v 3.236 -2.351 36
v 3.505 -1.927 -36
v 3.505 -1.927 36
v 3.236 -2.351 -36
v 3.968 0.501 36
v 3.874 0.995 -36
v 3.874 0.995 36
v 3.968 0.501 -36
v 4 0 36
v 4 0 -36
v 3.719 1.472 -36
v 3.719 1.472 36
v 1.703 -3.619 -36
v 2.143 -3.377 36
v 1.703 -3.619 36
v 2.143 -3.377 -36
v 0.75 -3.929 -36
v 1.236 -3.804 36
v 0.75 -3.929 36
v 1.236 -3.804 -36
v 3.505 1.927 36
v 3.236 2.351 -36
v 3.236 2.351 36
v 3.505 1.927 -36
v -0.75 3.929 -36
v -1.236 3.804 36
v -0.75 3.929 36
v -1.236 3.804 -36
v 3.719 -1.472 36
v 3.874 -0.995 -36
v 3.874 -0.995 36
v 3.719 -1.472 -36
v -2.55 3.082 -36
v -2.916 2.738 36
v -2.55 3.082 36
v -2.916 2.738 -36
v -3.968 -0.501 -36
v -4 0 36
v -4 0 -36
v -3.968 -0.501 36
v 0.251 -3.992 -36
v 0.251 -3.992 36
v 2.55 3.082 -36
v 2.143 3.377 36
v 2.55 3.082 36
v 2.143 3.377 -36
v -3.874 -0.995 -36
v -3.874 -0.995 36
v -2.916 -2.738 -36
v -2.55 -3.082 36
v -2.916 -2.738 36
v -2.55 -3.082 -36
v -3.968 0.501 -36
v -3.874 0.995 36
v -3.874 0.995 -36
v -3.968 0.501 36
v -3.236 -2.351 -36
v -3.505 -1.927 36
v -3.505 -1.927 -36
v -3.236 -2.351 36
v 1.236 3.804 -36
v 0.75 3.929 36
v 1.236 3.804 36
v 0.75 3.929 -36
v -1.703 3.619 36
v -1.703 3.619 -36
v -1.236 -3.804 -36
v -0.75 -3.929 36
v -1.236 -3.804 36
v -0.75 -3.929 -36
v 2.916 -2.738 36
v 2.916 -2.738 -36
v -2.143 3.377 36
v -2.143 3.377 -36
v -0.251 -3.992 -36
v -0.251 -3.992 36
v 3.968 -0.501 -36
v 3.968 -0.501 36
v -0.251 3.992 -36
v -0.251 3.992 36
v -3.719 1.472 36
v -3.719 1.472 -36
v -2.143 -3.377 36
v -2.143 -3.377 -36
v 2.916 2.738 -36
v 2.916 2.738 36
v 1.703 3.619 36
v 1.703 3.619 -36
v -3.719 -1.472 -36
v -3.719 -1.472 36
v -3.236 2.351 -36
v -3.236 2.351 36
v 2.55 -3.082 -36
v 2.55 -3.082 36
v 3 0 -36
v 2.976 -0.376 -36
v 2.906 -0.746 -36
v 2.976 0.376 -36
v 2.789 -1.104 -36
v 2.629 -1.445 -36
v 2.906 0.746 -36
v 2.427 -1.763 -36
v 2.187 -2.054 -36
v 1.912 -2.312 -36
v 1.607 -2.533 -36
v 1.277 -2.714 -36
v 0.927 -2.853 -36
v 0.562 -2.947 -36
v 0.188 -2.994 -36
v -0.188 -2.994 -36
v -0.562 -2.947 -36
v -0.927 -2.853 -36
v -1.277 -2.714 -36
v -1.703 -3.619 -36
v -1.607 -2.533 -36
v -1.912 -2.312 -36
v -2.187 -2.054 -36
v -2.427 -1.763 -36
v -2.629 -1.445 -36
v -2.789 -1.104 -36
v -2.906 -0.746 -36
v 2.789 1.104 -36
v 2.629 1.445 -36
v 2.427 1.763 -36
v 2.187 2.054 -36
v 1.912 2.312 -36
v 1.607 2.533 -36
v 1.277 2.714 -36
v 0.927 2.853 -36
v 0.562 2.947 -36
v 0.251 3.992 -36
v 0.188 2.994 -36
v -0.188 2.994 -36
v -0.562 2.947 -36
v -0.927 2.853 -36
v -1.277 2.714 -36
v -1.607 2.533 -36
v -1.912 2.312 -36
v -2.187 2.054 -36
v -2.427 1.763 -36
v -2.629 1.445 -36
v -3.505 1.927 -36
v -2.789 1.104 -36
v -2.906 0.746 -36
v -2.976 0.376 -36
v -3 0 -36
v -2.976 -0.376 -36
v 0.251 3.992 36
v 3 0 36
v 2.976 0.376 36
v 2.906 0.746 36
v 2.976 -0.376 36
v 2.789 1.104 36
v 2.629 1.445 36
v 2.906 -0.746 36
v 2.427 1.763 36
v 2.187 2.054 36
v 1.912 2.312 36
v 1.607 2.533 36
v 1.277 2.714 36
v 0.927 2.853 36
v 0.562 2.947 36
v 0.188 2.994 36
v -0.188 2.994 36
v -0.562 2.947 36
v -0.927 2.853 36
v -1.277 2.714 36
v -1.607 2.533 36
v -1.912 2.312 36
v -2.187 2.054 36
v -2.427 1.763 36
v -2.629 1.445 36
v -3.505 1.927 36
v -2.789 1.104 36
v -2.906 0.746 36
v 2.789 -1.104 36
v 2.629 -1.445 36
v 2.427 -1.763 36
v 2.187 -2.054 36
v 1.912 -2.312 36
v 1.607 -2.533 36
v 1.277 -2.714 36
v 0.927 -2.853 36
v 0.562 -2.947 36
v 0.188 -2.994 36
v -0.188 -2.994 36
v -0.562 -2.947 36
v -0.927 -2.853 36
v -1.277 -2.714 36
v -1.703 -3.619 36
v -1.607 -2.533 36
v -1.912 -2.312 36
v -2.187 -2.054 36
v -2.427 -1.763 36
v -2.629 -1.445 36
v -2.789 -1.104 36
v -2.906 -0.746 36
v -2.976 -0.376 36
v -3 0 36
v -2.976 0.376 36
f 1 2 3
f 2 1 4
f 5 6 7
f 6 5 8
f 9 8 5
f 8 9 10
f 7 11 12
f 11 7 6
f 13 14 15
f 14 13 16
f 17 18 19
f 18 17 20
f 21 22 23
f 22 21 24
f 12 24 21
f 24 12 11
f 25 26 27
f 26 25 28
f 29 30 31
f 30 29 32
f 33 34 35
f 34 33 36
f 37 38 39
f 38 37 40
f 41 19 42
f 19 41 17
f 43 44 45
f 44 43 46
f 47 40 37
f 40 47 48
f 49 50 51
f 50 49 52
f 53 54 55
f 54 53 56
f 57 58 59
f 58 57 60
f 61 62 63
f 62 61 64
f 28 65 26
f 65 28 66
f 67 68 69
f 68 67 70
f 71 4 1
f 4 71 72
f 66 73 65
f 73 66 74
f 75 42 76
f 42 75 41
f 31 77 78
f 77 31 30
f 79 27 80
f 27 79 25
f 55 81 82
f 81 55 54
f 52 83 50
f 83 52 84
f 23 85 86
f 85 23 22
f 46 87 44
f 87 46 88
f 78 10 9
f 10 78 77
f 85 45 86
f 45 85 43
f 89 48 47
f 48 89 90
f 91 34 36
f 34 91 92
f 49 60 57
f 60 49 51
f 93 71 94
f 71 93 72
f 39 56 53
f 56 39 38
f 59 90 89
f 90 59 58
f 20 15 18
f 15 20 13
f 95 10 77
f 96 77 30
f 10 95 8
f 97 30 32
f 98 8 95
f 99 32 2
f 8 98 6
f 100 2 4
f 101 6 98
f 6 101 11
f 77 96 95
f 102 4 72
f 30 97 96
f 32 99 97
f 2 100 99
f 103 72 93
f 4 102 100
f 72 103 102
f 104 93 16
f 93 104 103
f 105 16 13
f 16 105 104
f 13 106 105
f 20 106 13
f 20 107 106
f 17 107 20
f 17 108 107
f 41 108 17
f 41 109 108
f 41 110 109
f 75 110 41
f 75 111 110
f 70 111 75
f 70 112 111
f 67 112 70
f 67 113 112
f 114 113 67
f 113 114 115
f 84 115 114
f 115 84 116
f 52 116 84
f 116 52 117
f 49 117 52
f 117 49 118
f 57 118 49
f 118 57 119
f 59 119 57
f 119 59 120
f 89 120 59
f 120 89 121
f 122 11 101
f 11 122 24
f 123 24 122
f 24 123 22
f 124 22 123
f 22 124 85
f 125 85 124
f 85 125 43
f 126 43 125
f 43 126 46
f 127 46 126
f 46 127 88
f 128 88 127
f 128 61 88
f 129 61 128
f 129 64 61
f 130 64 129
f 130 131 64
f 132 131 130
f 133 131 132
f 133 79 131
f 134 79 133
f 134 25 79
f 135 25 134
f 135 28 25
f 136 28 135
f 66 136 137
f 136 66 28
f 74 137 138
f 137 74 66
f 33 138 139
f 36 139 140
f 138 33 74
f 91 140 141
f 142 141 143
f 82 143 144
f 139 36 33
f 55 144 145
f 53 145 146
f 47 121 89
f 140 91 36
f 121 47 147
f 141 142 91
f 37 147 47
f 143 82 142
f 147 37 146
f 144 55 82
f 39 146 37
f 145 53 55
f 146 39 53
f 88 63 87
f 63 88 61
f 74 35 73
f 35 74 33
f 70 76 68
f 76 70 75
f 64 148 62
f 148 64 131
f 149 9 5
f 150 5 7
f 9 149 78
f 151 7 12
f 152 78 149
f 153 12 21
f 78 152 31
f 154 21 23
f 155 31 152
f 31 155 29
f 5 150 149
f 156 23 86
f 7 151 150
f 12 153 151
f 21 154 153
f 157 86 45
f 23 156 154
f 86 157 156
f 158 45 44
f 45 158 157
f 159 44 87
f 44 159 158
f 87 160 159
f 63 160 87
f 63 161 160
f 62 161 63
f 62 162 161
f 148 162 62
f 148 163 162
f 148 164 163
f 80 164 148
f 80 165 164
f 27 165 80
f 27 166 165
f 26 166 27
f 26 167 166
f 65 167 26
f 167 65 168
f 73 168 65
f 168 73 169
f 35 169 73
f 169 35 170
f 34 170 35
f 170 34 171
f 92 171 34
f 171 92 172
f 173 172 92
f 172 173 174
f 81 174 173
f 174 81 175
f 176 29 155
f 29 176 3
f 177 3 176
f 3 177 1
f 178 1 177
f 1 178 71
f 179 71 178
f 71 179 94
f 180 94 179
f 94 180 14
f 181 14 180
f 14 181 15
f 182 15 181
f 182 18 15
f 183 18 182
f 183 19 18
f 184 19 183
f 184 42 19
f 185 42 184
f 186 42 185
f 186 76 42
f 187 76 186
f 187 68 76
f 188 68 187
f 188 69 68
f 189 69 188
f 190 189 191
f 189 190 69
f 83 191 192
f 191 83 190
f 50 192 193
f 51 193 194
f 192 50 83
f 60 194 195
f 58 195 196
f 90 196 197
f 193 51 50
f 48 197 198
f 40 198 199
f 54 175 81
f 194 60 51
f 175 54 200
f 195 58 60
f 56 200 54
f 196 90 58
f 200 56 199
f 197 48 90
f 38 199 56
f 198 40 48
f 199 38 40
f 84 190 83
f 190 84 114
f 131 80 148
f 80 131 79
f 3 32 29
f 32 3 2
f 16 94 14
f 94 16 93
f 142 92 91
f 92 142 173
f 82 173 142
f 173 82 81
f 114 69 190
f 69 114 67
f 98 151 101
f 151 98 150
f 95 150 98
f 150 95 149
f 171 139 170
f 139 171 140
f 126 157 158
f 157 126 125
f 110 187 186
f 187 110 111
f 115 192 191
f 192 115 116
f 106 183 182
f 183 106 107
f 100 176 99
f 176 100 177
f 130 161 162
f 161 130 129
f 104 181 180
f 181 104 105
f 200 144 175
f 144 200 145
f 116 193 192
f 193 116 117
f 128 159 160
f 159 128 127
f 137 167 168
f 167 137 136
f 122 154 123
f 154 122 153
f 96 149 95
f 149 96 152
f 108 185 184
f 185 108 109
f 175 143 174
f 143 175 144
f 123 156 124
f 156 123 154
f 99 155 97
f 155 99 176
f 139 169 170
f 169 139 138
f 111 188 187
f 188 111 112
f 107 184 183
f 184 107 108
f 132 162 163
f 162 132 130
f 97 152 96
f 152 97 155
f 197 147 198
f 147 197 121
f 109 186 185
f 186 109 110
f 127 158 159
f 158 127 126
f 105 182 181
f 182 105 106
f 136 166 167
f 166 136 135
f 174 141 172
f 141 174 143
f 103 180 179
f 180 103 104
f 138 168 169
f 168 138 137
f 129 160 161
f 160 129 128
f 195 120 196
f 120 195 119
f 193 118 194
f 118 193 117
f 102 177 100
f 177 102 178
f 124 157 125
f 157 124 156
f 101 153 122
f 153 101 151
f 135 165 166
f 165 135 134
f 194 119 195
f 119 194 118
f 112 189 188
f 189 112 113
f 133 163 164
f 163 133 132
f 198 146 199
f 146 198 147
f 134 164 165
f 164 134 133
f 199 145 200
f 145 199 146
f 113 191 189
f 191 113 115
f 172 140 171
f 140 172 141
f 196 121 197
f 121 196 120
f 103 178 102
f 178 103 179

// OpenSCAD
$fn = 50;


difference() {
	union() {
		translate(v = [0, 0, -36.0000000000]) {
			cylinder(h = 72, r = 4.0000000000);
		}
	}
	union() {
		translate(v = [0, 0, -100.0000000000]) {
			cylinder(h = 200, r = 3.0000000000);
		}
	}
}
